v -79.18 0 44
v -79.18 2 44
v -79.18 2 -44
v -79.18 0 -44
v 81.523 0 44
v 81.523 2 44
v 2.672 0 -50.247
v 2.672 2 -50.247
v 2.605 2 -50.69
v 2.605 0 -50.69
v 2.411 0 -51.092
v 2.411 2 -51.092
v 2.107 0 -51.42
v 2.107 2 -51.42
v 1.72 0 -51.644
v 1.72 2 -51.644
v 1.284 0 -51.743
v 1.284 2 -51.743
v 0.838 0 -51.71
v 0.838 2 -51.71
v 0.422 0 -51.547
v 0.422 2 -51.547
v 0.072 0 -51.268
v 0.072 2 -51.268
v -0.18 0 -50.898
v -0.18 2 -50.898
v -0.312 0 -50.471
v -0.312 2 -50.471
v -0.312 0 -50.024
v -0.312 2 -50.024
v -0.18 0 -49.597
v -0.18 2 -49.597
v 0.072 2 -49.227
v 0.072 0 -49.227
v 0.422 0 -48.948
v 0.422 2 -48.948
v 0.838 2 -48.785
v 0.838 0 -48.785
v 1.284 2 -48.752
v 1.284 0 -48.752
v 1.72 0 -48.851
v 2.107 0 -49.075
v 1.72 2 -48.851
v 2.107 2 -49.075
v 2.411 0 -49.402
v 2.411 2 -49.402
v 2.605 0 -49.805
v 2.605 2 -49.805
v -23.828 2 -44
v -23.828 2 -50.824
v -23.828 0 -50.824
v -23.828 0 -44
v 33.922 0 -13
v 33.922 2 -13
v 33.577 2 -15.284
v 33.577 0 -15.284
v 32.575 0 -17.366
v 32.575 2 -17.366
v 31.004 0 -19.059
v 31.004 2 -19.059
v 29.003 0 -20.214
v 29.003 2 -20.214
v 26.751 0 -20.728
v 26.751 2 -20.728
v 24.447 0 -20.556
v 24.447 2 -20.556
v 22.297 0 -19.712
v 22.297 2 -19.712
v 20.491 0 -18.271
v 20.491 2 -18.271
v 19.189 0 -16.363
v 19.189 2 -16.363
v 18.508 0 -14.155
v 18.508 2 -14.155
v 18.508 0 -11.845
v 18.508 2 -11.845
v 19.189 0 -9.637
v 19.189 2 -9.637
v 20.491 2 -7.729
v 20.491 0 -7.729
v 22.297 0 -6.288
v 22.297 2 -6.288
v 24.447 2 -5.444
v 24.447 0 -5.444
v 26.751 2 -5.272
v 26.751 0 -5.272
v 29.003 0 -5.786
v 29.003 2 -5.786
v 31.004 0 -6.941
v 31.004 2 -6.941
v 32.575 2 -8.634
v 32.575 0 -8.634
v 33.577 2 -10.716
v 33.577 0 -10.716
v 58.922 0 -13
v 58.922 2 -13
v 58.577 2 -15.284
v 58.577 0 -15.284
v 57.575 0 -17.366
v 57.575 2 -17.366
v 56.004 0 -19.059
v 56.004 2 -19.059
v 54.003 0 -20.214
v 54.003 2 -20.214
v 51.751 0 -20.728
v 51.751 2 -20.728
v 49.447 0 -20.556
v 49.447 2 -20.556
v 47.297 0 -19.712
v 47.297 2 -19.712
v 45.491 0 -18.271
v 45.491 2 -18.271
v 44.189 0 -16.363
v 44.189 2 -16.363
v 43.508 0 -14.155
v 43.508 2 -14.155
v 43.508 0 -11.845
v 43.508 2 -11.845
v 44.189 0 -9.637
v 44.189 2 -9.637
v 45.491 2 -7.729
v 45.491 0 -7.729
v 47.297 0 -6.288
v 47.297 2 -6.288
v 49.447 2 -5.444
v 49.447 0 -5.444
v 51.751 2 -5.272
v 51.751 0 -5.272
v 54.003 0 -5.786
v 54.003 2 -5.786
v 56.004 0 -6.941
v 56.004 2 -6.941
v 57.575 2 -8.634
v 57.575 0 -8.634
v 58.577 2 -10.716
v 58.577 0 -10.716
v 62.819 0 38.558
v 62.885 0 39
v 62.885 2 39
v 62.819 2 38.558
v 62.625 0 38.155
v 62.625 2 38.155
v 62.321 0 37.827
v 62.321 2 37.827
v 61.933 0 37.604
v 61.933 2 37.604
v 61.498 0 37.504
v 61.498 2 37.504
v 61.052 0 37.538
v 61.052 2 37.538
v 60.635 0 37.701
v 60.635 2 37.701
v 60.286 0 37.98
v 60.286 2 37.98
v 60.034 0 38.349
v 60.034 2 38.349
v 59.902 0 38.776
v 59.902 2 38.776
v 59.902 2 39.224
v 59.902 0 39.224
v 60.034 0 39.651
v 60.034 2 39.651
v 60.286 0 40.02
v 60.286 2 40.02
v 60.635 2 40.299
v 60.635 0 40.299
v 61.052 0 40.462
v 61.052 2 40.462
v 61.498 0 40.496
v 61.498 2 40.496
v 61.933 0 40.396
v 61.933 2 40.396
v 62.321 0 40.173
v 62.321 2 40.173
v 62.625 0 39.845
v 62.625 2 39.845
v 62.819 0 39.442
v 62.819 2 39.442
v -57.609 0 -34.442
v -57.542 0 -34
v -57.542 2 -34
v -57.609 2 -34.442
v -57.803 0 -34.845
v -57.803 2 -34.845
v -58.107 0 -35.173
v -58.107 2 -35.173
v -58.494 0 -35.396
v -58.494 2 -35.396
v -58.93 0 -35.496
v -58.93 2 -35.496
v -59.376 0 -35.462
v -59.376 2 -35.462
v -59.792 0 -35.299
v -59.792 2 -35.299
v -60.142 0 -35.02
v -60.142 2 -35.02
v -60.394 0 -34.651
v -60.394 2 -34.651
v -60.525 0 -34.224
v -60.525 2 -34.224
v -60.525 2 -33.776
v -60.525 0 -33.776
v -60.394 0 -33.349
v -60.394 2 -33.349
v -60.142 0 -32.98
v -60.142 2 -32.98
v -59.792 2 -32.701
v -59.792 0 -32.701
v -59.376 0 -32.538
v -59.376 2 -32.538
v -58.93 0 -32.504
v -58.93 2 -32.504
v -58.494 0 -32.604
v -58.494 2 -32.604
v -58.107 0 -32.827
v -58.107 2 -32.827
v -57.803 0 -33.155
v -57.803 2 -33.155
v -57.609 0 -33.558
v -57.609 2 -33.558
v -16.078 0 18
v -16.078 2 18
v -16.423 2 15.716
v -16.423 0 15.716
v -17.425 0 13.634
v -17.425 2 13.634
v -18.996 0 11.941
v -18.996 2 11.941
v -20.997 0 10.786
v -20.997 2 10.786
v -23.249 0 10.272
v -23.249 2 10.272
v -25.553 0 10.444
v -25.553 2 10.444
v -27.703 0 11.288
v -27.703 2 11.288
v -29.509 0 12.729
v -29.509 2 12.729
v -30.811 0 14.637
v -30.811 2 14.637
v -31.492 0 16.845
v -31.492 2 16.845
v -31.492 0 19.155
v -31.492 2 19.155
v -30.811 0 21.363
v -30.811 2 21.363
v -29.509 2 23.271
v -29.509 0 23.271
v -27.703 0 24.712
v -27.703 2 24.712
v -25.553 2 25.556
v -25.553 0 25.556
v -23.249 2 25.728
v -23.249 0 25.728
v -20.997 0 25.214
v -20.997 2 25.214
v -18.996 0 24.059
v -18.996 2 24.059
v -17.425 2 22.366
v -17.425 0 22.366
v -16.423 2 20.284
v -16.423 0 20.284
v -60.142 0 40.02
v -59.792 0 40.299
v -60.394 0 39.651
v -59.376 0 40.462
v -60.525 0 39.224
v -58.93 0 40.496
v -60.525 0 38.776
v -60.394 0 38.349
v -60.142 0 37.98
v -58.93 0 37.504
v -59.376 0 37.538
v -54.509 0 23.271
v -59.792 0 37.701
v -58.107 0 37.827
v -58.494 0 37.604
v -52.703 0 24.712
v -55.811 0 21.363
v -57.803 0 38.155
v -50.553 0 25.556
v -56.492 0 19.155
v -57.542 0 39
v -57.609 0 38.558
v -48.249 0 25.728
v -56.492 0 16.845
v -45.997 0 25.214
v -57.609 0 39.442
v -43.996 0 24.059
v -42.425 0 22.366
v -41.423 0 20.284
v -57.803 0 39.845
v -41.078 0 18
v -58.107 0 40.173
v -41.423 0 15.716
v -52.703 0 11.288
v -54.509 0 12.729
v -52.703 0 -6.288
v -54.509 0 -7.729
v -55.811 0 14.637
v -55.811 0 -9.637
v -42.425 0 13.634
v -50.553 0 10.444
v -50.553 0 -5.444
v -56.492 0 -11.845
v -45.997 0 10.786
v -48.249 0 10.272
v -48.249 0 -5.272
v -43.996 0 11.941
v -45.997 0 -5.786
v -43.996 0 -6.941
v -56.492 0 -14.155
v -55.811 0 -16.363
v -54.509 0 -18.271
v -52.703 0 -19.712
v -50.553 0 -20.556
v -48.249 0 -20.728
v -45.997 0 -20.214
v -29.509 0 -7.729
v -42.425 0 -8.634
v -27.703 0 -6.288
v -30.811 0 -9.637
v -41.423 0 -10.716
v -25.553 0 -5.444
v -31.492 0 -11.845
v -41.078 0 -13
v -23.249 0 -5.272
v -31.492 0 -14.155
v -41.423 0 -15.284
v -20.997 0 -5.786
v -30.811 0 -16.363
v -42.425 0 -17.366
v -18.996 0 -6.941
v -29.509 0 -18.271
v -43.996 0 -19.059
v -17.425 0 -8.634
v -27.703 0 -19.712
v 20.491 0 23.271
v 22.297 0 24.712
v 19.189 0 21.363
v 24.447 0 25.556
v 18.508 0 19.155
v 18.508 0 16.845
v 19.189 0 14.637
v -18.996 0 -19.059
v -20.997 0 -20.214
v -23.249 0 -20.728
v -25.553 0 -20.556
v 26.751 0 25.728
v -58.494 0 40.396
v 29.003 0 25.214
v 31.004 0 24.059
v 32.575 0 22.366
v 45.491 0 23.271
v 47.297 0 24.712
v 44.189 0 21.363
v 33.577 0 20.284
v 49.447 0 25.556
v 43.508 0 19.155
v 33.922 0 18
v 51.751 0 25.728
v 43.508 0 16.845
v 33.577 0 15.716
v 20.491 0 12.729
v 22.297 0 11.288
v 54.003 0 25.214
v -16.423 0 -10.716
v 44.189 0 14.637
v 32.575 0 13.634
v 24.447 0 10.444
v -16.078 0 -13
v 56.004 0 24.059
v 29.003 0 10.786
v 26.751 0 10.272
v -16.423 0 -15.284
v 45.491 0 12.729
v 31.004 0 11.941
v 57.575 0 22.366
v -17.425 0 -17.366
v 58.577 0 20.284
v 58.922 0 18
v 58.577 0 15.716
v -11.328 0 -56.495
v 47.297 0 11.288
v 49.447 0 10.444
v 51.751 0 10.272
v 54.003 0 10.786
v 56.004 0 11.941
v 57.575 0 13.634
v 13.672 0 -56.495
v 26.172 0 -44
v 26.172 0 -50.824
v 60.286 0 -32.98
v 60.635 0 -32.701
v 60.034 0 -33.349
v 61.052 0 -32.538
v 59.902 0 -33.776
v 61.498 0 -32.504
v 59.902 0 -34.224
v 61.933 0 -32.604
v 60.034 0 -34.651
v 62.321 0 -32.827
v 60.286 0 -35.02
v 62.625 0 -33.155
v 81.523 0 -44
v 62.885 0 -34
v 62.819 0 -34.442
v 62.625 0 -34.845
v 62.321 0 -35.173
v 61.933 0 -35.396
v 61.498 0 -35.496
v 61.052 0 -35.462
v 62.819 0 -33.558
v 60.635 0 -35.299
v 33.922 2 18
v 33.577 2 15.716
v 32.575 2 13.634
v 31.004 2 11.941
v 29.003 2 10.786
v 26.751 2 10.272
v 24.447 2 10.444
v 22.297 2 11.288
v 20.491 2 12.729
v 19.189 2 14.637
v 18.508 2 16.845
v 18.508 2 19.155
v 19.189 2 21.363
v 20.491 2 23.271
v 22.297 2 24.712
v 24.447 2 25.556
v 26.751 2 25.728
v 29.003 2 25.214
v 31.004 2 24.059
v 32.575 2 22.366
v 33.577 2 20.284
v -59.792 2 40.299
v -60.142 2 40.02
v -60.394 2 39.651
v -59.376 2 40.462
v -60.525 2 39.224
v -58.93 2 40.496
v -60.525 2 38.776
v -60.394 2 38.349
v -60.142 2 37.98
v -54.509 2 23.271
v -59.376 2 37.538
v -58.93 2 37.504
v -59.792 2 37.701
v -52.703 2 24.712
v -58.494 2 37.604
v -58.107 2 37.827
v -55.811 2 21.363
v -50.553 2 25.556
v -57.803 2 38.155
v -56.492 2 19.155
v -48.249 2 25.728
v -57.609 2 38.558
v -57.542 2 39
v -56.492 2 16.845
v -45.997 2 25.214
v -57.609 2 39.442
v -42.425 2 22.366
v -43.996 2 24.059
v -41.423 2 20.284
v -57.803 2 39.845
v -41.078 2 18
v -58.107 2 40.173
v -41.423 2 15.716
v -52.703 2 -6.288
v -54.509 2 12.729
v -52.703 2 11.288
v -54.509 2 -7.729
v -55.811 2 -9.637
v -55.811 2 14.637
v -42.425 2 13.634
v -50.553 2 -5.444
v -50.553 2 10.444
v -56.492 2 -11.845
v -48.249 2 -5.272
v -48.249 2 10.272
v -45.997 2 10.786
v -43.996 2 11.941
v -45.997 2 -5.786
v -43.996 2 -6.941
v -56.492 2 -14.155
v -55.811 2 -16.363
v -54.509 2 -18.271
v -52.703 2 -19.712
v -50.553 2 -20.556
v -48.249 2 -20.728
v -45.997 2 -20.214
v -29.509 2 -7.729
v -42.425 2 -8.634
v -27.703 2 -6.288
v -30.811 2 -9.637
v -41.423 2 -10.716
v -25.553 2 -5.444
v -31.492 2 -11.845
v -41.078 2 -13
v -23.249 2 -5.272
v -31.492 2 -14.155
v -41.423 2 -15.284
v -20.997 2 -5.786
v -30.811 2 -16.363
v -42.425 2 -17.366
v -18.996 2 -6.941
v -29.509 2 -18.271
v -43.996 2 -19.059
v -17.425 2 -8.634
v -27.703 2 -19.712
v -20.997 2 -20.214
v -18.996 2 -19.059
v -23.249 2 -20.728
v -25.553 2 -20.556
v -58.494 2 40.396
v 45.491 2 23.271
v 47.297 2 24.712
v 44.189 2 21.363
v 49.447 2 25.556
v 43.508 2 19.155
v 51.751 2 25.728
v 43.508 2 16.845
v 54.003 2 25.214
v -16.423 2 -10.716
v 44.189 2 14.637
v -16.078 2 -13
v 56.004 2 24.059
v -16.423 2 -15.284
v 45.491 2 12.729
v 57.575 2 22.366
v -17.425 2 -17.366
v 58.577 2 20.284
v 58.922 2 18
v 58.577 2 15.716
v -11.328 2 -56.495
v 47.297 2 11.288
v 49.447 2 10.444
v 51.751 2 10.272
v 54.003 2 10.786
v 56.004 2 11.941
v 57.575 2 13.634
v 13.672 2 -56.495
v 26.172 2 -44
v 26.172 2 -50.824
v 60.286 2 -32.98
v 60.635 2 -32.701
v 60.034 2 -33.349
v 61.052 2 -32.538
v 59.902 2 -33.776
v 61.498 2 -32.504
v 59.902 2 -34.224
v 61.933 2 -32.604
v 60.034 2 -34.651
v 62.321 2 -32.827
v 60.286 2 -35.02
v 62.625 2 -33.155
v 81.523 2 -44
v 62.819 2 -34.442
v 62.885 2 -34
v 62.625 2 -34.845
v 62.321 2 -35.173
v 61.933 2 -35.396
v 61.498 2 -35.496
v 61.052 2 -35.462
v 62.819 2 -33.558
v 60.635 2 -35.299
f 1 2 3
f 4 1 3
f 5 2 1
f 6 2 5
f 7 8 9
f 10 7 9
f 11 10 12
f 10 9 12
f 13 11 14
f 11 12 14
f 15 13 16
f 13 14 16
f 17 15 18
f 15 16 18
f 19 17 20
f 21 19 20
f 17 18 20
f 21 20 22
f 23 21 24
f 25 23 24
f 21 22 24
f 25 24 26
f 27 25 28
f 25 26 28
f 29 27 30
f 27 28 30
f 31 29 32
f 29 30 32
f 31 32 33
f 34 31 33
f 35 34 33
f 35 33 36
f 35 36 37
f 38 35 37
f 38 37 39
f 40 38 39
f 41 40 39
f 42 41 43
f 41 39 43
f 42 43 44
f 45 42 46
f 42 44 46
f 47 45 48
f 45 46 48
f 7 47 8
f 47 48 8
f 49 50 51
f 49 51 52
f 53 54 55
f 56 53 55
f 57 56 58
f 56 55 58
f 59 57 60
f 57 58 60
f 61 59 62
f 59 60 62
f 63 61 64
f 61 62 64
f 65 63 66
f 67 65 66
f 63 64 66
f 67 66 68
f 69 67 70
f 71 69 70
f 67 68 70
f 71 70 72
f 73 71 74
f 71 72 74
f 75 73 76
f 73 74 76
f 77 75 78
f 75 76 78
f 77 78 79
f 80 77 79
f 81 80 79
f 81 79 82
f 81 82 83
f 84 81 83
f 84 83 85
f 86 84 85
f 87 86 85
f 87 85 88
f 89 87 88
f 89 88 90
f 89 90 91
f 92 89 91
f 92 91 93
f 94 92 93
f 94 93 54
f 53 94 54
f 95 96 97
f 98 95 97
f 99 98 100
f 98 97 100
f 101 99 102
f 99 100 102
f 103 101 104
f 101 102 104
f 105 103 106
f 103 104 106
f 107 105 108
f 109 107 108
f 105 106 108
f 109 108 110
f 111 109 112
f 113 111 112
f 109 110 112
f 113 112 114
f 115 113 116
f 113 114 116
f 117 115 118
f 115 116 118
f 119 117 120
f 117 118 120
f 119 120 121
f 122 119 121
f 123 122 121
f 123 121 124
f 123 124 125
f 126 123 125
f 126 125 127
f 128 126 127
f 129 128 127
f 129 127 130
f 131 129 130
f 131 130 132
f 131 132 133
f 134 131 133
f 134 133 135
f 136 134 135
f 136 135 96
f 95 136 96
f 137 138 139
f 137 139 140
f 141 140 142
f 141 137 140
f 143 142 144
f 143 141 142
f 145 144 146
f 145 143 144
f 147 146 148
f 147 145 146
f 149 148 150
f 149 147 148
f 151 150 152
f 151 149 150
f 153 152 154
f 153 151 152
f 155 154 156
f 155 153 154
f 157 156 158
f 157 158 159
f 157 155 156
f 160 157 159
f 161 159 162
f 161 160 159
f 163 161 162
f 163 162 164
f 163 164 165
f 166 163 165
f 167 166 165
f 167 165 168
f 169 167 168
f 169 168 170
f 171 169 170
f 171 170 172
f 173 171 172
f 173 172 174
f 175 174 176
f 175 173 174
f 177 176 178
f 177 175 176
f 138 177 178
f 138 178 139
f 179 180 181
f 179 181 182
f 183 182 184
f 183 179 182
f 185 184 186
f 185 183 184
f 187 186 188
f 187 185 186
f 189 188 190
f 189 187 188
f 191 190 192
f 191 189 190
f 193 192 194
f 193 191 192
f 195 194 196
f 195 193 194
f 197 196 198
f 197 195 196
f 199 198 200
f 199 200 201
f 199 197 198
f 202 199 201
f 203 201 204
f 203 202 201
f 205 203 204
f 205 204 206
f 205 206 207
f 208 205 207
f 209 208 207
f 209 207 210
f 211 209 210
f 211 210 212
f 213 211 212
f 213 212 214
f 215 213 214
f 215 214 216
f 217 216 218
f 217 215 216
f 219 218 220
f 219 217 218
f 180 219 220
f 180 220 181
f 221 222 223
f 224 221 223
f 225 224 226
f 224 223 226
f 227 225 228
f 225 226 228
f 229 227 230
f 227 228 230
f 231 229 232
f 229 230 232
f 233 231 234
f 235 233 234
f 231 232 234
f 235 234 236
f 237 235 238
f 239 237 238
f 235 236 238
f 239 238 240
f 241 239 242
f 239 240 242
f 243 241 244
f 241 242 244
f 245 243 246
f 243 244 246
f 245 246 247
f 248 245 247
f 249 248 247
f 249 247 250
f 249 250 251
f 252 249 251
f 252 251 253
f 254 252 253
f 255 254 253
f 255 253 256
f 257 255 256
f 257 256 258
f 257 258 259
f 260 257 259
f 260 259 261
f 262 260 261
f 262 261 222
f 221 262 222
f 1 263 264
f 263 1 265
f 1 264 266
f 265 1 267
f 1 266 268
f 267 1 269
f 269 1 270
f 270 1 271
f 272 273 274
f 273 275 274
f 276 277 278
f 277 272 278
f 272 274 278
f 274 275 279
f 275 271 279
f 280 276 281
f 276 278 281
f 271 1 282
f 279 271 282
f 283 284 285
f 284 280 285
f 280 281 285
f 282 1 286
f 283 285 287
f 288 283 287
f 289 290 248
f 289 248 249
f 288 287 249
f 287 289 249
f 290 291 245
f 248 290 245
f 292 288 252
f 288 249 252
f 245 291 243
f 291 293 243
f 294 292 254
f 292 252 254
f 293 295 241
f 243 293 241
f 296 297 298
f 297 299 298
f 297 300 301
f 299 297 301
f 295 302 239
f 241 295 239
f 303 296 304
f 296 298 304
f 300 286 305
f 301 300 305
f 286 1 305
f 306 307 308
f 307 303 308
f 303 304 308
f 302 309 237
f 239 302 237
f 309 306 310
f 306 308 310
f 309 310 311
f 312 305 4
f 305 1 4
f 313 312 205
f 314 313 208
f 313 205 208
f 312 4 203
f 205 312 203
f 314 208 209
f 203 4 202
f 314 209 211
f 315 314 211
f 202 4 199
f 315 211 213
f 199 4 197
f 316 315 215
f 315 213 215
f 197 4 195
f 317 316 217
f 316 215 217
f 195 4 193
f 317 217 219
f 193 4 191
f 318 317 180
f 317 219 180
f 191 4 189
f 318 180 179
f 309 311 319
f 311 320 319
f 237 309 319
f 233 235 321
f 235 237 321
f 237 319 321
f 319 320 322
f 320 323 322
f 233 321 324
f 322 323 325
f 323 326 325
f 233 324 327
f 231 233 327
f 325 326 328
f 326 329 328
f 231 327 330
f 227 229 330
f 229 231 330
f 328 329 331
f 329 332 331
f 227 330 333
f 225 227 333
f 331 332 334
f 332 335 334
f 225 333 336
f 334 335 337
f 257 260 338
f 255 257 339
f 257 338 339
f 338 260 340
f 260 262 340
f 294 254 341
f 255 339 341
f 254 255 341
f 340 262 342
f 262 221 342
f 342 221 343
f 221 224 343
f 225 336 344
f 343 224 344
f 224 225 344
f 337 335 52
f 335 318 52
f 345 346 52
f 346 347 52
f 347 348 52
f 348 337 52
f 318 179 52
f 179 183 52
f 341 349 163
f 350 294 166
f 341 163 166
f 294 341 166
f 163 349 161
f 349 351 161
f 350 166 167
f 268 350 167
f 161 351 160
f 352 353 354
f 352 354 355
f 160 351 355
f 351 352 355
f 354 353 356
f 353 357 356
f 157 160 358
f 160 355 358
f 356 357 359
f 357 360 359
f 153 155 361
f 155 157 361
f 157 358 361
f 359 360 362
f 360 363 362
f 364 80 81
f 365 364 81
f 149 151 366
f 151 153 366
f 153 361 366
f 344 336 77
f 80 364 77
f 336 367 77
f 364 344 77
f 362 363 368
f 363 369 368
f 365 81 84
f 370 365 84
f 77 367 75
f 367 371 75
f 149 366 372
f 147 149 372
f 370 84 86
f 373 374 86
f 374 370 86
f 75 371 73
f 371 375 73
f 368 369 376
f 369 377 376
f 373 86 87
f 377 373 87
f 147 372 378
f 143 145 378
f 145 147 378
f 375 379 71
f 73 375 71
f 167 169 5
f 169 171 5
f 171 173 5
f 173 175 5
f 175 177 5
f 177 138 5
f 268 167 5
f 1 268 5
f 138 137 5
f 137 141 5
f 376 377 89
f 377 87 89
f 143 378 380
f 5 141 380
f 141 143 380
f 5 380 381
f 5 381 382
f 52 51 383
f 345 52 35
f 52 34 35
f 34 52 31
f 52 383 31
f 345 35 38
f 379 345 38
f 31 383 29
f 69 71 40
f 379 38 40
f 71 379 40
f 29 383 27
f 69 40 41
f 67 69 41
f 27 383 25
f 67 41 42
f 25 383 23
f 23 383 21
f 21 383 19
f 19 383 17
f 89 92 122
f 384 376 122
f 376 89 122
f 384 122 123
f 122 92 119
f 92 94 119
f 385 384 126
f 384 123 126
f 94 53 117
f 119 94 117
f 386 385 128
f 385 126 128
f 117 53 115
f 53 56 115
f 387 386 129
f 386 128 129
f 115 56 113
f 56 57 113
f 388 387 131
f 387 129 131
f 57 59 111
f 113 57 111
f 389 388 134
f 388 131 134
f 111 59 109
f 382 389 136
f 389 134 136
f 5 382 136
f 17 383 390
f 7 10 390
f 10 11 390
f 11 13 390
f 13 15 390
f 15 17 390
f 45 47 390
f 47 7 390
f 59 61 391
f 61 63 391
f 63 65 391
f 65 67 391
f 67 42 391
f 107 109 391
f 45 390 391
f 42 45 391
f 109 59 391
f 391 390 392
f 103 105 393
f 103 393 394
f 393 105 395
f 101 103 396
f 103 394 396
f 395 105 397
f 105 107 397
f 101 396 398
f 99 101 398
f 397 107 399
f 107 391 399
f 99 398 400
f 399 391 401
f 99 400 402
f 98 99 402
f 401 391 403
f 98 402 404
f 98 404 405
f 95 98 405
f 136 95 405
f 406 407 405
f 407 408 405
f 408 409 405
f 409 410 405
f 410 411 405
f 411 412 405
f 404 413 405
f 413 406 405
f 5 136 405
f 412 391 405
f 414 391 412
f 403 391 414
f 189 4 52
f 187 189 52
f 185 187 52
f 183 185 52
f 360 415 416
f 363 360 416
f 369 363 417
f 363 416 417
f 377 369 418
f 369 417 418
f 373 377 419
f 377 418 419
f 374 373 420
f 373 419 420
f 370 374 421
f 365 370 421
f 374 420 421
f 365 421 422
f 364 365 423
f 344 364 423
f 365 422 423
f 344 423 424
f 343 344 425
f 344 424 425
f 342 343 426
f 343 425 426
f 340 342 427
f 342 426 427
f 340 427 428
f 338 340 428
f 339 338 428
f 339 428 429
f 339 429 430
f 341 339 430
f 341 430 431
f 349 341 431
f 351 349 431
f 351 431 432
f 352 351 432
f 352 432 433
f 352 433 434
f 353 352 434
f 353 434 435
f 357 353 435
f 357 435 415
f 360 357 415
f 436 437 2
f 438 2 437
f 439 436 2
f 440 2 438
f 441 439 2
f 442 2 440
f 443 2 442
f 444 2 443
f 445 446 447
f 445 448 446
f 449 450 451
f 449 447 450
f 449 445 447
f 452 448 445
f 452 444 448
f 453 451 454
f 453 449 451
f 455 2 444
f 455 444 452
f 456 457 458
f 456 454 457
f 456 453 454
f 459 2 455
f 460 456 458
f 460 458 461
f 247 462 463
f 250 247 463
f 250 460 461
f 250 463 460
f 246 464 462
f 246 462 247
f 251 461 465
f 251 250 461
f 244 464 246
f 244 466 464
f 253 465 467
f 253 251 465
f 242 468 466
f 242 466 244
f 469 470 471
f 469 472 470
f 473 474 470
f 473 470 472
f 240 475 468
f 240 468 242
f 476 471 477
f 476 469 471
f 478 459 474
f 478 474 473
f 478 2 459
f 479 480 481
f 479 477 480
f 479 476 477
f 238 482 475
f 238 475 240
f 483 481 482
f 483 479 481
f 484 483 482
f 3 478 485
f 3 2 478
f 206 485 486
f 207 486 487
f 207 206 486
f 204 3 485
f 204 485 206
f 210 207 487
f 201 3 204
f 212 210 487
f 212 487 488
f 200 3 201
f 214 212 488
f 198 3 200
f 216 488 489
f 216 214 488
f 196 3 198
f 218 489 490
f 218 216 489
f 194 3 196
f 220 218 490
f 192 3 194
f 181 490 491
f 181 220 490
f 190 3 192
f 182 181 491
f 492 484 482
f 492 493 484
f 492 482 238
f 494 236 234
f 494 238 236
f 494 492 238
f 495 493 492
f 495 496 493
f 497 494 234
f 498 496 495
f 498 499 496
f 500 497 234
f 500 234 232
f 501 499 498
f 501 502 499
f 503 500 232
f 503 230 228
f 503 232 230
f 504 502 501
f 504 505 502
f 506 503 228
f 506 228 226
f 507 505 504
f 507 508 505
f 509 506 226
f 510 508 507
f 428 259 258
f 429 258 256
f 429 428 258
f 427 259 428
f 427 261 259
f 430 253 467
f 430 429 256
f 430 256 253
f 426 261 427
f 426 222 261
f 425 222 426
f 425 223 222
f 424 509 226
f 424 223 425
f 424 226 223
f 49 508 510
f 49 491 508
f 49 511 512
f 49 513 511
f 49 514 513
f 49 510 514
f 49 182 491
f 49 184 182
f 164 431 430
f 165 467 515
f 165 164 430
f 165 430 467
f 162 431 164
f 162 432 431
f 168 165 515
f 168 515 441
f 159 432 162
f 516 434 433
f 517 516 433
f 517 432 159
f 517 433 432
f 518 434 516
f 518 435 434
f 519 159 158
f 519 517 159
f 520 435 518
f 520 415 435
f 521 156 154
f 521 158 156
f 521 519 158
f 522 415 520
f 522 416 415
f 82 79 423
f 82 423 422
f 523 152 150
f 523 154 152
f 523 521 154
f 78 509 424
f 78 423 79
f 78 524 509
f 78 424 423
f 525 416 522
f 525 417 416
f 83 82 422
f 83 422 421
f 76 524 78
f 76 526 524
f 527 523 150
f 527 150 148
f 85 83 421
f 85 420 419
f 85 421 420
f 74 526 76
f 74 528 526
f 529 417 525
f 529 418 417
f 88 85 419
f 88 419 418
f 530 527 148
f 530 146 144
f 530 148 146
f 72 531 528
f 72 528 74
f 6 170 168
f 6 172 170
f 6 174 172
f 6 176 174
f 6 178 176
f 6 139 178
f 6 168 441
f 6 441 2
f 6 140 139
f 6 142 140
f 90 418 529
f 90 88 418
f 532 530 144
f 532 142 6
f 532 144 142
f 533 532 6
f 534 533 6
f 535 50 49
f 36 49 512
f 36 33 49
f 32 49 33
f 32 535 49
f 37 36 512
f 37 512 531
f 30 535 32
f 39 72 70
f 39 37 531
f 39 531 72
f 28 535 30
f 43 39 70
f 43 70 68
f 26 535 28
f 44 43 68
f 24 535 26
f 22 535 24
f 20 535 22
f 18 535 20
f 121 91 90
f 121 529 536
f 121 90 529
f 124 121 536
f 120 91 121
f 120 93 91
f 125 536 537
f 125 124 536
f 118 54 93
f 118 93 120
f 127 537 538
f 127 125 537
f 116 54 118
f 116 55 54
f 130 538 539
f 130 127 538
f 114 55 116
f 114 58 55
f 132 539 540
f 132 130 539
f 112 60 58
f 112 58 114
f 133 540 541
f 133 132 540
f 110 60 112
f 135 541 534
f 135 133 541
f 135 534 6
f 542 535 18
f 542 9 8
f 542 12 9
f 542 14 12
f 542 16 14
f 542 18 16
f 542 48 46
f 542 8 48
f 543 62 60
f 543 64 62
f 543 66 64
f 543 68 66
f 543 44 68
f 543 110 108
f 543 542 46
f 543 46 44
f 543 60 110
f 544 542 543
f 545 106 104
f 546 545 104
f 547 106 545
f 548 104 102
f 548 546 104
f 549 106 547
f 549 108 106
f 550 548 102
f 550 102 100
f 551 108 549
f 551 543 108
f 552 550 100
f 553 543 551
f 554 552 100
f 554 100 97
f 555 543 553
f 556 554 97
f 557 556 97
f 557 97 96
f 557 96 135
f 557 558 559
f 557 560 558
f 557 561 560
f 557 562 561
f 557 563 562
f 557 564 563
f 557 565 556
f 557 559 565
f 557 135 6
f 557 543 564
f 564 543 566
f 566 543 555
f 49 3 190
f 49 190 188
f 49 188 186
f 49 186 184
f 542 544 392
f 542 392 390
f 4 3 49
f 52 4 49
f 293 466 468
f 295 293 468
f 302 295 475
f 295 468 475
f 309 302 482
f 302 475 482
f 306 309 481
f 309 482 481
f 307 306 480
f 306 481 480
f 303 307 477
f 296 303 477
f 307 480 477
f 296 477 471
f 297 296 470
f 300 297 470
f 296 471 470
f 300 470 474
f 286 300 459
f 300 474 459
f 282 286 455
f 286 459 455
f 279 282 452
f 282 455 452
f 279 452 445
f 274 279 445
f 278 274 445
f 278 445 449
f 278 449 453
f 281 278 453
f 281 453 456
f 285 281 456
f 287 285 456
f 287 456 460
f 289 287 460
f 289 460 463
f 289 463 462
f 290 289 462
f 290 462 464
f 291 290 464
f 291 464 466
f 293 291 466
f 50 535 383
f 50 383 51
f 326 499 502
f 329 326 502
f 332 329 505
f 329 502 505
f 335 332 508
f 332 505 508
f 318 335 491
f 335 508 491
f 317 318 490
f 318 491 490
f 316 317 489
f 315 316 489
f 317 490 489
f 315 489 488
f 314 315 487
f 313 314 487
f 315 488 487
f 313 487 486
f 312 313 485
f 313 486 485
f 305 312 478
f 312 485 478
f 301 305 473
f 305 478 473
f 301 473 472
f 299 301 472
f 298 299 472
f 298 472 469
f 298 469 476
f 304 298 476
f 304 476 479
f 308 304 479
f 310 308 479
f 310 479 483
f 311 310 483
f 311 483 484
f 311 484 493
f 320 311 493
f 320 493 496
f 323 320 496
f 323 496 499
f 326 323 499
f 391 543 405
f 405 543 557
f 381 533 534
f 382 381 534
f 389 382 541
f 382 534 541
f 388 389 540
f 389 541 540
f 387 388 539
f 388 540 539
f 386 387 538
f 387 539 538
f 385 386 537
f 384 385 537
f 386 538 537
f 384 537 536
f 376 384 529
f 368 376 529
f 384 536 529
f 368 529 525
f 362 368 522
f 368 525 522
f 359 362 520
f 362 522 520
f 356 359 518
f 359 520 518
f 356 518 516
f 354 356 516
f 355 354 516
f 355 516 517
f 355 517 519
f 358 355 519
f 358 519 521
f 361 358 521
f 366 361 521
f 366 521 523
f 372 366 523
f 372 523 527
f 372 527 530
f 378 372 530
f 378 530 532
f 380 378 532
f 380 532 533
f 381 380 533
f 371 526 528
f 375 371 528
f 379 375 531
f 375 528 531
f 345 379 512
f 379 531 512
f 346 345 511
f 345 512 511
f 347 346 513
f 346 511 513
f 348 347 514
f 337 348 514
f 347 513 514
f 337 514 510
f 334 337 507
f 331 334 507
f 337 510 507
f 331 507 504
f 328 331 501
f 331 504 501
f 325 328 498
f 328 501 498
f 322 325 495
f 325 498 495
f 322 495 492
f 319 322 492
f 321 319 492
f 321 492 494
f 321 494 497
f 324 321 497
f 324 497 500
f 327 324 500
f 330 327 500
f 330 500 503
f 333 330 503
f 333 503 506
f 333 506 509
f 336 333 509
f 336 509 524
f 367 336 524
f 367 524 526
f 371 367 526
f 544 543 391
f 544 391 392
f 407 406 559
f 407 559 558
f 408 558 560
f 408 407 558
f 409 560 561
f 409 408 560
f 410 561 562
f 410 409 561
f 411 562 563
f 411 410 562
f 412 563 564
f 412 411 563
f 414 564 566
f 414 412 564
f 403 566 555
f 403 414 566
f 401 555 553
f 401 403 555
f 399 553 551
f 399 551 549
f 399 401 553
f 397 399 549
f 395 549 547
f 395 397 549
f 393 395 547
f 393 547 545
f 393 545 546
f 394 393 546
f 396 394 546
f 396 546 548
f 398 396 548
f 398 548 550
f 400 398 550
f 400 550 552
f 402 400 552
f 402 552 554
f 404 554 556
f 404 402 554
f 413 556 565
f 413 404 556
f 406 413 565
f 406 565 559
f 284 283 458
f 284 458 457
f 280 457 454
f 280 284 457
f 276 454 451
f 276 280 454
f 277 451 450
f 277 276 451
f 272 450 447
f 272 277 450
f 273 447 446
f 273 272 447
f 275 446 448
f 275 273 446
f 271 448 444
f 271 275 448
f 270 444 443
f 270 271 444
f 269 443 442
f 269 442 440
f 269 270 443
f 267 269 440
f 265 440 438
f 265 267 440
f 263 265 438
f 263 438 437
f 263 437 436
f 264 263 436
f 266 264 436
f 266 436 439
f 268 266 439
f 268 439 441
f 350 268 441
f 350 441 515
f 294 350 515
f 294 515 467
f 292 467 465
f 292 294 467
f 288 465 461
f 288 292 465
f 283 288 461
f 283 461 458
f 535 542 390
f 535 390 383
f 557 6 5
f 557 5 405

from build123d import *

# Parameters (mm, degrees)
SKETCH1_W           = 155.702807198
SKETCH1_H           = 58
SKETCH1_R           = 1.5
BOSS_EXTRUDE2_DEPTH = 2
SKETCH2_W           = 5
SKETCH2_H           = 88
BOSS_EXTRUDE3_DEPTH = 2
SKETCH3_R           = 7.75
CUT_EXTRUDE1_DEPTH  = 10
SKETCH4_R           = 1.5
BOSS_EXTRUDE4_DEPTH = 2
SKETCH7_W           = 2.5
SKETCH7_H           = 88
CUT_EXTRUDE2_DEPTH  = 10


with BuildPart() as part:
    # Sketch1 → Boss-Extrude2 (new body)
    with BuildSketch(Plane(origin=(0, 0, 0), x_dir=(1, 0, 0), z_dir=(0, 1, 0))):
        with Locations((1.171695753, -5)):
            Rectangle(SKETCH1_W, SKETCH1_H)
        Polygon((-76.679707846, 44), (-76.679707846, 24), (79.023099352, 24), (79.023099352, 44), (62.885457038, 44), (59.885457038, 44), (-57.542065533, 44), (-60.542065533, 44), align=None)
        with Locations((-59.042065533, 34)):
            Circle(SKETCH1_R, mode=Mode.SUBTRACT)
        with Locations((61.385457038, 34)):
            Circle(SKETCH1_R, mode=Mode.SUBTRACT)
        Polygon((-76.679707846, -44), (-60.542065533, -44), (-57.542065533, -44), (59.885457038, -44), (62.885457038, -44), (79.023099352, -44), (79.023099352, -34), (-76.679707846, -34), align=None)
        with Locations((-59.042065533, -39)):
            Circle(SKETCH1_R, mode=Mode.SUBTRACT)
        with Locations((61.385457038, -39)):
            Circle(SKETCH1_R, mode=Mode.SUBTRACT)
    extrude(amount=BOSS_EXTRUDE2_DEPTH)

    # Sketch2 → Boss-Extrude3 (add)
    with BuildSketch(Plane(origin=(0, 2, 0), x_dir=(1, 0, 0), z_dir=(0, 1, 0))):
        with Locations((81.523099352, 0)):
            Rectangle(SKETCH2_W, SKETCH2_H)
        with Locations((-79.179707846, 0)):
            Rectangle(SKETCH2_W, SKETCH2_H)
    extrude(amount=-BOSS_EXTRUDE3_DEPTH)

    # Sketch3 → Cut-Extrude1 (cut)
    with BuildSketch(Plane(origin=(0, 2, 0), x_dir=(1, 0, 0), z_dir=(0, 1, 0))):
        with Locations((26.171695753, 13)):
            Circle(SKETCH3_R)
        with Locations((51.171695753, 13)):
            Circle(SKETCH3_R)
        with Locations((-23.828304247, 13)):
            Circle(SKETCH3_R)
        with Locations((-48.828304247, 13)):
            Circle(SKETCH3_R)
        with Locations((-48.828304247, -18)):
            Circle(SKETCH3_R)
        with Locations((-23.828304247, -18)):
            Circle(SKETCH3_R)
        with Locations((51.171695753, -18)):
            Circle(SKETCH3_R)
        with Locations((26.171695753, -18)):
            Circle(SKETCH3_R)
    extrude(amount=-CUT_EXTRUDE1_DEPTH, mode=Mode.SUBTRACT)

    # Sketch4 → Boss-Extrude4 (add)
    with BuildSketch(Plane(origin=(0, 2, 0), x_dir=(1, 0, 0), z_dir=(0, 1, 0))):
        Polygon((-23.828304247, 44), (26.171695753, 44), (26.171695753, 50.823606938), (13.671695753, 56.49492606), (-11.328304247, 56.49492606), (-23.828304247, 50.823606938), align=None)
        with Locations((1.171695753, 50.24746303)):
            Circle(SKETCH4_R, mode=Mode.SUBTRACT)
    extrude(amount=-BOSS_EXTRUDE4_DEPTH)

    # Sketch7 → Cut-Extrude2 (cut)
    with BuildSketch(Plane(origin=(0, 2, 0), x_dir=(1, 0, 0), z_dir=(0, 1, 0))):
        with Locations((-80.429707846, 0)):
            Rectangle(SKETCH7_W, SKETCH7_H)
        with Locations((82.773099352, 0)):
            Rectangle(SKETCH7_W, SKETCH7_H)
    extrude(amount=-CUT_EXTRUDE2_DEPTH, mode=Mode.SUBTRACT)


solid = part.part
